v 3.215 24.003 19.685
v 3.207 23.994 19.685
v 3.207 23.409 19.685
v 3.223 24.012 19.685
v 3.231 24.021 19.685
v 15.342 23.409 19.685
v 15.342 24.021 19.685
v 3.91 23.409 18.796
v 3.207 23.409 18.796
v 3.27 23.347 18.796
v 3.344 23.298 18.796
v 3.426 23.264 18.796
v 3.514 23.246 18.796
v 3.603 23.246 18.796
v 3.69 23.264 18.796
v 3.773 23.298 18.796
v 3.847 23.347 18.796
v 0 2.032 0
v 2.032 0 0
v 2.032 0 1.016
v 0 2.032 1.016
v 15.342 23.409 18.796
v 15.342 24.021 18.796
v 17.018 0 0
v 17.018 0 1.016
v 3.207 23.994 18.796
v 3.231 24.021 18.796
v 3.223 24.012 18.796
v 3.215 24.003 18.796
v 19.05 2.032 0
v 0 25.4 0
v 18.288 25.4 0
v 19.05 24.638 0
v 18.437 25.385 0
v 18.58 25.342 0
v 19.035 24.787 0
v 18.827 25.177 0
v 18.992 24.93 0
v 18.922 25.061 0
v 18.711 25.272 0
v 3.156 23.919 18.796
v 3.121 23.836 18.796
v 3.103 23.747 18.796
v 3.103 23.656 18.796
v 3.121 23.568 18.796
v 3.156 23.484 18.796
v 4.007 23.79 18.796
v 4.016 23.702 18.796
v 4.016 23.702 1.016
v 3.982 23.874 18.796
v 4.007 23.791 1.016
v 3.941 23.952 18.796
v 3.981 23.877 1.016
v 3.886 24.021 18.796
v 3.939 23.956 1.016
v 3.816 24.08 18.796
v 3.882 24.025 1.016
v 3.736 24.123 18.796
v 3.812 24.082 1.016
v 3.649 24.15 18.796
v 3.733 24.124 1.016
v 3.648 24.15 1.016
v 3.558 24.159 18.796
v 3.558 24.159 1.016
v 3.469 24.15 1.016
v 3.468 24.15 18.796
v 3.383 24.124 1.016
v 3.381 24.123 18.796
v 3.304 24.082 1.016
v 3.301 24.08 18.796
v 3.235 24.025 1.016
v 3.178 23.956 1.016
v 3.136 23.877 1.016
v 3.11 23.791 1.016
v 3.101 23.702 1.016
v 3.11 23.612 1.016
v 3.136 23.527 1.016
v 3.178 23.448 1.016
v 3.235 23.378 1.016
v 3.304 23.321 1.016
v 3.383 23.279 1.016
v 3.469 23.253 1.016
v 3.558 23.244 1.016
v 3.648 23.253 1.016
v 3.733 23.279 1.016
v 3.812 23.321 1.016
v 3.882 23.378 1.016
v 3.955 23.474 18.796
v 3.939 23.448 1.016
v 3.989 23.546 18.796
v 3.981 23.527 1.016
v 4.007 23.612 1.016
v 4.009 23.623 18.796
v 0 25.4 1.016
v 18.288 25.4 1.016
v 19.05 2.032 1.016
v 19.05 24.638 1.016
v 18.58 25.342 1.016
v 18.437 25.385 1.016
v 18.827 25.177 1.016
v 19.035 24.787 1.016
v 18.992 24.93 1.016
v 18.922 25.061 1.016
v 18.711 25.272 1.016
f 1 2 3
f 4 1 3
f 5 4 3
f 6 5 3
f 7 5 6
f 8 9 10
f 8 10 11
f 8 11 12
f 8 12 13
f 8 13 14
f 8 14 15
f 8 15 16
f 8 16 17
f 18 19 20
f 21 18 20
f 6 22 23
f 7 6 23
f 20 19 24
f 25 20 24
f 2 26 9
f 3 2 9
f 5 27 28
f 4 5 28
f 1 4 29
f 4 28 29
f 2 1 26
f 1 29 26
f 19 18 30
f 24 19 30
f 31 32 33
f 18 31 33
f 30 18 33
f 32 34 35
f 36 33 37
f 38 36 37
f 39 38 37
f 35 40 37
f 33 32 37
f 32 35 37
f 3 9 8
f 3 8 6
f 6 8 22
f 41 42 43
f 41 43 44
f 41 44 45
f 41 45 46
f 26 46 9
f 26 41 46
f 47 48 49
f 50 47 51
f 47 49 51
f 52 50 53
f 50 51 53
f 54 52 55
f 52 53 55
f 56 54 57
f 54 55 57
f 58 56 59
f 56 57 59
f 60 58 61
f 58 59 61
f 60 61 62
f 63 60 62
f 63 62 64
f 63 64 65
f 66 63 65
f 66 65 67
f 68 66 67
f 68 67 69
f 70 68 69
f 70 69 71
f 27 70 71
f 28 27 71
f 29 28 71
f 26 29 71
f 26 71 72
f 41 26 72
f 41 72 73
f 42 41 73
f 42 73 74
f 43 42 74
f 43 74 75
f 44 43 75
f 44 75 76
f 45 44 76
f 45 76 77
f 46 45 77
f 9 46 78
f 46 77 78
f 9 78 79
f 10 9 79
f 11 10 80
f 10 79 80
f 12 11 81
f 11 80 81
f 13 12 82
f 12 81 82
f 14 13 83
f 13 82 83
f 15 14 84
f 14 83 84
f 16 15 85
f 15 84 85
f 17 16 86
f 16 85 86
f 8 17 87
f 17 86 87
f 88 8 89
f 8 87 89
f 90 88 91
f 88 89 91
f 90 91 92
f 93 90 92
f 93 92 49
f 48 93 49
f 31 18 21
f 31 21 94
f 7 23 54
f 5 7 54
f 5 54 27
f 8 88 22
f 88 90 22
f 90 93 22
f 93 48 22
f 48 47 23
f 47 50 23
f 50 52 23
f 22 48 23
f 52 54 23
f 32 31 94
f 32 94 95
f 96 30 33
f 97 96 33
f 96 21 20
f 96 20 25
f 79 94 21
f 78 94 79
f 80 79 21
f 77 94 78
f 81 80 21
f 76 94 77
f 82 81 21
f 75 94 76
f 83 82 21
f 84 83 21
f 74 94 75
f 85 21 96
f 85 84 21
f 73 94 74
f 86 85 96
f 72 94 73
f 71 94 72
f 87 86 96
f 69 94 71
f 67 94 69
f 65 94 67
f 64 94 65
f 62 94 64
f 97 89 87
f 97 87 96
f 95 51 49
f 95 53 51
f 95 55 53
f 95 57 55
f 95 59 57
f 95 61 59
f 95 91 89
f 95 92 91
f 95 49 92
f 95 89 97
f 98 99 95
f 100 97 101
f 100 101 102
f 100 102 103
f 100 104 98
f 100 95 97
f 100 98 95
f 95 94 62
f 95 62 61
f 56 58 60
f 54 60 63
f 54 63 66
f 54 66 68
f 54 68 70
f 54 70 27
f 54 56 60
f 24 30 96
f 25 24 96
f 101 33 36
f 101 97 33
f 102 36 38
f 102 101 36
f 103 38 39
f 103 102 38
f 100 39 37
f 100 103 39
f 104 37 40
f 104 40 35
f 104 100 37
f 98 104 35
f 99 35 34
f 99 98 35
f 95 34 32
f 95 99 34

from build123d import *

# Parameters (mm, degrees)
F0_W     = 19.05
F0_H     = 25.4
F1_DEPTH = 1.016
F2_SIZE  = 2.032
F3_SIZE  = 2.032
F4_R     = 0.762
F5_R     = 0.4573869554
F6_DEPTH = 17.78
F9_DEPTH = 0.889


# Not quite as in the source:
# - the program builds the solid bodies; features that only make, move or delete a surface that nothing else refers to are left out


with BuildPart() as f1:
    # F0 (on Top) → F1 (new body)
    with BuildSketch(Plane.XY):
        with Locations((9.525, 12.7)):
            Rectangle(F0_W, F0_H)
    extrude(amount=F1_DEPTH)

    # F2
    f2_edges = [f1.edges().sort_by_distance(p)[0] for p in [
        (0, 0, 0.508),
    ]]
    chamfer(f2_edges, length=F2_SIZE)

    # F3
    f3_edges = [f1.edges().sort_by_distance(p)[0] for p in [
        (19.05, 0, 0.508),
    ]]
    chamfer(f3_edges, length=F3_SIZE)

    # F4
    f4_edges = [f1.edges().sort_by_distance(p)[0] for p in [
        (19.05, 25.4, 0.508),
    ]]
    fillet(f4_edges, radius=F4_R)

    # F5 (on face) → F6 (join)
    with BuildSketch(Plane.XY.offset(1.016)):
        with Locations((3.5583837889, 23.701650244)):
            Circle(F5_R)
    extrude(amount=F6_DEPTH)

    # F8 (on face) → F9 (join)
    with BuildSketch(Plane.XY.offset(18.796)):
        with BuildLine():
            ThreePointArc((4.0157707443, 23.701650244), (3.9885840141, 23.5463099941), (3.9102557402, 23.4094363551))
            Line((3.9102557402, 23.4094363551), (15.3415361419, 23.4094363551))
            Line((15.3415361419, 23.4094363551), (15.3415361419, 24.0212995559))
            Line((15.3415361419, 24.0212995559), (3.8855338223, 24.0212995559))
            ThreePointArc((3.8855338223, 24.0212995559), (3.9819619899, 23.8742316295), (4.0157707443, 23.701650244))
        make_face()
        with BuildLine():
            Line((3.2065118376, 23.9938641329), (3.2065118376, 23.4094363551))
            Line((3.2065118376, 23.4094363551), (3.9102557402, 23.4094363551))
            ThreePointArc((3.9102557402, 23.4094363551), (3.9885840141, 23.5463099941), (4.0157707443, 23.701650244))
            ThreePointArc((4.0157707443, 23.701650244), (3.9819619899, 23.8742316295), (3.8855338223, 24.0212995559))
            Line((3.8855338223, 24.0212995559), (3.2312337555, 24.0212995559))
            ThreePointArc((3.2312337555, 24.0212995559), (3.2185957822, 24.0078314607), (3.2065118376, 23.9938641329))
        make_face()
    extrude(amount=F9_DEPTH)


solid = f1.part
